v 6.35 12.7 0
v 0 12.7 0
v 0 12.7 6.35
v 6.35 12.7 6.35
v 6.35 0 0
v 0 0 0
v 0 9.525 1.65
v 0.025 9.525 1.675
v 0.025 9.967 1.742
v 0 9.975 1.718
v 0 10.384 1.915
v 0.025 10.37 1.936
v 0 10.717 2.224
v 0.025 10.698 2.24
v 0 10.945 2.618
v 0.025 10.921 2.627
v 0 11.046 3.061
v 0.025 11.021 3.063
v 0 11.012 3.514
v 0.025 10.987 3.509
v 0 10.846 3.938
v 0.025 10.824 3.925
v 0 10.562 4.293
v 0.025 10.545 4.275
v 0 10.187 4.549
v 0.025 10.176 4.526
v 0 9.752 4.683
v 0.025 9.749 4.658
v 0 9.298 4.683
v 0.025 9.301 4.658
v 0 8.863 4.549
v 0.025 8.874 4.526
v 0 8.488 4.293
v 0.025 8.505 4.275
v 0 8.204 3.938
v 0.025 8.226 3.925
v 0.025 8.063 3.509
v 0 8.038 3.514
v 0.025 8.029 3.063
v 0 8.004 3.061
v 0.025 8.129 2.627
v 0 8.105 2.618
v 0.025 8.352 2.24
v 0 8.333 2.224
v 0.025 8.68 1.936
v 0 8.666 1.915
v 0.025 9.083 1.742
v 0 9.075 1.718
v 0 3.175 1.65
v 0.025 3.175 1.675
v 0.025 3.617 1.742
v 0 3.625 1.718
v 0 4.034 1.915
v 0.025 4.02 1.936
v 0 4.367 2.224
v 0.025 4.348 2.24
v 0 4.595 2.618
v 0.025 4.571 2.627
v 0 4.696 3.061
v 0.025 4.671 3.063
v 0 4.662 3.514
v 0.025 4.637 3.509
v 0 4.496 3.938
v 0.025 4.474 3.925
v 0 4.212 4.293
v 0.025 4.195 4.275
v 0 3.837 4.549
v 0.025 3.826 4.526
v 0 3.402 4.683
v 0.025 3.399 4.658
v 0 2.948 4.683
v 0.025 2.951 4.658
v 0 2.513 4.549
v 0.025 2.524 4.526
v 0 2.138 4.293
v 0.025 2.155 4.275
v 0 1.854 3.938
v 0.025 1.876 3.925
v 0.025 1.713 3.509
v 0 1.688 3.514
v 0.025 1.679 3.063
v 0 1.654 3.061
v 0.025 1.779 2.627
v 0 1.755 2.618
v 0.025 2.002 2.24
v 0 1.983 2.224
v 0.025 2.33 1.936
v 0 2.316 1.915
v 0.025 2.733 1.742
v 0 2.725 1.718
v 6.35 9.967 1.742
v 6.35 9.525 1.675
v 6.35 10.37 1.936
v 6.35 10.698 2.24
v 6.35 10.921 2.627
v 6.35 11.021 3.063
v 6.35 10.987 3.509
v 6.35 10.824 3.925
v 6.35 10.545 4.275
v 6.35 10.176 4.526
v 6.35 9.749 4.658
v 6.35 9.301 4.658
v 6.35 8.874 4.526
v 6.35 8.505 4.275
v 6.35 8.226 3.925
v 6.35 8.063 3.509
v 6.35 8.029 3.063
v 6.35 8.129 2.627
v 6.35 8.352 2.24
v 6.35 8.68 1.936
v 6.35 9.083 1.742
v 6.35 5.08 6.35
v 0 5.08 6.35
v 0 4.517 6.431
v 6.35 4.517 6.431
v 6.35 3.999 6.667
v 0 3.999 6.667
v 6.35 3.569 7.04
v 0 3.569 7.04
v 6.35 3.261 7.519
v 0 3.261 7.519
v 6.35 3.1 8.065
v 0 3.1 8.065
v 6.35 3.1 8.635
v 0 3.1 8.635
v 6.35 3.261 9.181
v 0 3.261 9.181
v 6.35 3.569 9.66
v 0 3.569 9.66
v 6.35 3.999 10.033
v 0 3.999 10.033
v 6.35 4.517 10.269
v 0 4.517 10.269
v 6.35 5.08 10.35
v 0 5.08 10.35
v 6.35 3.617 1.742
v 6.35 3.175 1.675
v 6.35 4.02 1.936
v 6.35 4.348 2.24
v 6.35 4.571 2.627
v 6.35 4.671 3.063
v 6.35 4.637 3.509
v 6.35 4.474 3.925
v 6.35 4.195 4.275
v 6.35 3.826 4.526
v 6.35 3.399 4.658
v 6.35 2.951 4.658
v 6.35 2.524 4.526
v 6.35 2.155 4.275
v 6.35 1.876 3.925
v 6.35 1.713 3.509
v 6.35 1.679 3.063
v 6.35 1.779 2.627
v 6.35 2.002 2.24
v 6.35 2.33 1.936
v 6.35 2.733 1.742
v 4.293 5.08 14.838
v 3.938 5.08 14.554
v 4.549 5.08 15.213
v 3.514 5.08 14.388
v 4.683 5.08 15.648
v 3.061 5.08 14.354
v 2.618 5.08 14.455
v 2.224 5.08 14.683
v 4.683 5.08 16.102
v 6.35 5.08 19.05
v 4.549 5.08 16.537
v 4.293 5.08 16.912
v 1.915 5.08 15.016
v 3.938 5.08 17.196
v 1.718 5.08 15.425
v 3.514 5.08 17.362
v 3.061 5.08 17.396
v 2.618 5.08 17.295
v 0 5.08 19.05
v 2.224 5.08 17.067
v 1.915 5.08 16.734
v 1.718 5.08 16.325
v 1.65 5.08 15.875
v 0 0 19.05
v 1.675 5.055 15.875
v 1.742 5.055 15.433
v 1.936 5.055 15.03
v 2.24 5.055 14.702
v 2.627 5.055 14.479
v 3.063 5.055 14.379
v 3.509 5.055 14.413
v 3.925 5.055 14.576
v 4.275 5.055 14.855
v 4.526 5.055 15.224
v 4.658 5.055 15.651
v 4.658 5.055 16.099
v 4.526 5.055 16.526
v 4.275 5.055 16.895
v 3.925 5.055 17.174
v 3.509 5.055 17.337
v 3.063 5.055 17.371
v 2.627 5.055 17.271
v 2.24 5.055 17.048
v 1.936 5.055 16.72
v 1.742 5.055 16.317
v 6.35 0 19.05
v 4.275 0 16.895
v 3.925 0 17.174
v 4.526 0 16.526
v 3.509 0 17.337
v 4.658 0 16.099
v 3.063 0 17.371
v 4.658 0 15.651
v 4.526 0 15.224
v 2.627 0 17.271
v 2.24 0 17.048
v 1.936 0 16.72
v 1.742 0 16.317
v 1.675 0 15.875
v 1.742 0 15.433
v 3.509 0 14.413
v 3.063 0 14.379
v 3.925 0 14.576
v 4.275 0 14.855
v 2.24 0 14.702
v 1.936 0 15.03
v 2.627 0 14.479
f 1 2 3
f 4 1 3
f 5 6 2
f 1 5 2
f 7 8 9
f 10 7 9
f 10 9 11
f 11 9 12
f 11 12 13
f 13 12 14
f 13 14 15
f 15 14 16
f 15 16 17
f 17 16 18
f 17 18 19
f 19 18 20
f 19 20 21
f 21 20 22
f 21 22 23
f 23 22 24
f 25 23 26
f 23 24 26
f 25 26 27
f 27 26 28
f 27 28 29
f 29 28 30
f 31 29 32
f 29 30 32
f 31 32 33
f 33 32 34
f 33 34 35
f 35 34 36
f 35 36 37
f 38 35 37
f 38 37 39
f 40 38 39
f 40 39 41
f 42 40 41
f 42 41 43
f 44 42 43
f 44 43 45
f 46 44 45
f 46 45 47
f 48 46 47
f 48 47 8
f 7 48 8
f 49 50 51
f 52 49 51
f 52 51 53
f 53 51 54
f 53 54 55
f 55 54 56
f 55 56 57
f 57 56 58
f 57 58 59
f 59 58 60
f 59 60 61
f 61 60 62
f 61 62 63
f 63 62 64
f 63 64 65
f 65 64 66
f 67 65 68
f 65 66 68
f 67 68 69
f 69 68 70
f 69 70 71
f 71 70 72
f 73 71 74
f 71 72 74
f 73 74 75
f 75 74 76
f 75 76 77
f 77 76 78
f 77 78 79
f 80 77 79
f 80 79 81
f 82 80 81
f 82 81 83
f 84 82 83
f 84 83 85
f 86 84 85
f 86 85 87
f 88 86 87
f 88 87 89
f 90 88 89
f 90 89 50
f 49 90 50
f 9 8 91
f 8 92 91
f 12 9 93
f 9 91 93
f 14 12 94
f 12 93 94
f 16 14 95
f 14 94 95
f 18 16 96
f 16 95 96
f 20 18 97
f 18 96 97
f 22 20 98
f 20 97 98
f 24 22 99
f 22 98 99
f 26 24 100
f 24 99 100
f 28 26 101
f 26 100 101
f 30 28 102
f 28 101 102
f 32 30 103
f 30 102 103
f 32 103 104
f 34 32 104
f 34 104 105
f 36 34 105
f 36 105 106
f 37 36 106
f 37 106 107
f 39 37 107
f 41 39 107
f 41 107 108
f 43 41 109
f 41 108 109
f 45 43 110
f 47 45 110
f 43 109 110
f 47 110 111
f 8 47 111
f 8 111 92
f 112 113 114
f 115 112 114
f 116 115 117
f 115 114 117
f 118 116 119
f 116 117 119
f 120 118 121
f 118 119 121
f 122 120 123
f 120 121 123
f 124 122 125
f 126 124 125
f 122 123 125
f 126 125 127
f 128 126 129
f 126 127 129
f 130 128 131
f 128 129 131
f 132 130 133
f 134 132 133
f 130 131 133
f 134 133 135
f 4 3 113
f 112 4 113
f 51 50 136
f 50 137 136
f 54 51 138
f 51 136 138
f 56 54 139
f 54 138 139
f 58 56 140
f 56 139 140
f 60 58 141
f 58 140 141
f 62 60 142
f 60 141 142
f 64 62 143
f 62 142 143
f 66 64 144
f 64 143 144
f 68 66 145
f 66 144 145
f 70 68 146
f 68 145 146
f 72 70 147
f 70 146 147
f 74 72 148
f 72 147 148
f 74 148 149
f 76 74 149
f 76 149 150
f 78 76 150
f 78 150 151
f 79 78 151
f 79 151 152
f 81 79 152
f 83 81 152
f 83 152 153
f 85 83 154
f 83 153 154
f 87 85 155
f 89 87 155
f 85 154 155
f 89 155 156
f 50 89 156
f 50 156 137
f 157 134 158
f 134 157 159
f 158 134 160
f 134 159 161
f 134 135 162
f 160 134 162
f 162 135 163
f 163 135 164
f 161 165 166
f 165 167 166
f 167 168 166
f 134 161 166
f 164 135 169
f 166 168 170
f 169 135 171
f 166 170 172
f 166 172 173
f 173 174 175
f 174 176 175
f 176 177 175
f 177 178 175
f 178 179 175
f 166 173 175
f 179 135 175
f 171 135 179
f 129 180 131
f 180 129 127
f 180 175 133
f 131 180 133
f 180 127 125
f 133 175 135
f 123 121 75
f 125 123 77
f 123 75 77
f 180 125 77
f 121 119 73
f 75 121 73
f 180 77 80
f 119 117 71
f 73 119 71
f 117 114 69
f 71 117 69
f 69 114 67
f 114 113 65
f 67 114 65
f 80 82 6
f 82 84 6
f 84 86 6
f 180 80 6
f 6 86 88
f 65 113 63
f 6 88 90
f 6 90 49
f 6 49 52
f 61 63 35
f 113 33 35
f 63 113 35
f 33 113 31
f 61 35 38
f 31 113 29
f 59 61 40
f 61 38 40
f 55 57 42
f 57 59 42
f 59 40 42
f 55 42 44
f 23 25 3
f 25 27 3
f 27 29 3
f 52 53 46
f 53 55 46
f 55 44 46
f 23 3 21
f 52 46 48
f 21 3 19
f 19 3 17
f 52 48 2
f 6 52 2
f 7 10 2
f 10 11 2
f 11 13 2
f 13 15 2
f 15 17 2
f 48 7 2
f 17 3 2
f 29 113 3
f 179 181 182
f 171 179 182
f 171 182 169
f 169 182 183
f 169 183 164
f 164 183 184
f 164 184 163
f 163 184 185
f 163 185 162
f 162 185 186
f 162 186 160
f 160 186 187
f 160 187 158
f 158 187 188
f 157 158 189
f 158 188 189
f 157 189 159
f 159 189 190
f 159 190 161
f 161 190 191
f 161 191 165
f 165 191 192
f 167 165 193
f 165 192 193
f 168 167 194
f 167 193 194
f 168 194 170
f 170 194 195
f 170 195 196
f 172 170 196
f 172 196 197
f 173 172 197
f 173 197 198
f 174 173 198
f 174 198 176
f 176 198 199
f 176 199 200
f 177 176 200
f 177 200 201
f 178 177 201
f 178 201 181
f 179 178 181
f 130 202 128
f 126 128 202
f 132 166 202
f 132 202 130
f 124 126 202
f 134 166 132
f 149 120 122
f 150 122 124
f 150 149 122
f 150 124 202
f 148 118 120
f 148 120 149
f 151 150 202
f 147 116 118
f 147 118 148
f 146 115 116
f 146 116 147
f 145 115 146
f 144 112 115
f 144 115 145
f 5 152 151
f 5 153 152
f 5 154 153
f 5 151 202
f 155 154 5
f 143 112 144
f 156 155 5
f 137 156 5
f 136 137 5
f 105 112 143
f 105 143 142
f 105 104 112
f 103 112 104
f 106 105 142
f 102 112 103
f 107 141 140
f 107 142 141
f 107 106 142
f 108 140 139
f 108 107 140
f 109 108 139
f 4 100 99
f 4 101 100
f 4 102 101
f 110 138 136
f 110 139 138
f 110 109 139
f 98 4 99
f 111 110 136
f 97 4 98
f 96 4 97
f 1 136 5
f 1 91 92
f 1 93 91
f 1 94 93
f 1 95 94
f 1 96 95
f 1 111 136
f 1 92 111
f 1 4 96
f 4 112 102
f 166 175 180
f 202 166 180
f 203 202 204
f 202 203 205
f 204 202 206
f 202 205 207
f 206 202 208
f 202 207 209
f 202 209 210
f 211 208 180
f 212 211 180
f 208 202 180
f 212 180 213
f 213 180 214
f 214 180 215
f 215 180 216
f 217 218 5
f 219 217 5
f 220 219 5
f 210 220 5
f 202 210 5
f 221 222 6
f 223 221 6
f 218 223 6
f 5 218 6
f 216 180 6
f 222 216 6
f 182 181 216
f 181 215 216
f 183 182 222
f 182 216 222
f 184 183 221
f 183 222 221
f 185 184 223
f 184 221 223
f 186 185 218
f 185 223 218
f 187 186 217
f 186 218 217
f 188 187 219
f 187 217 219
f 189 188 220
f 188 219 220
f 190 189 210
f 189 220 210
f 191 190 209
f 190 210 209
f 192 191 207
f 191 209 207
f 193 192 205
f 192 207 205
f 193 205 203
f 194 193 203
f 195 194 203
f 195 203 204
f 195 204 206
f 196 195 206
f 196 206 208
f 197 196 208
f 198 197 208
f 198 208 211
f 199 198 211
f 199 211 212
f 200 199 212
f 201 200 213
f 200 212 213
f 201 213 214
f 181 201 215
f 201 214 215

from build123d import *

# Parameters (mm, degrees)
BOSS_EXTRUDE1_DEPTH             = 6.35
F_3_0MM_DOWEL_HOLE1_D           = 3
F_3_0MM_DOWEL_HOLE1_CSINK_D     = 3.05
F_3_0MM_DOWEL_HOLE1_CSINK_ANGLE = 90
F_3_0MM_DOWEL_HOLE2_D           = 3
F_3_0MM_DOWEL_HOLE2_CSINK_D     = 3.05
F_3_0MM_DOWEL_HOLE2_CSINK_ANGLE = 90


with BuildPart() as part:
    # Sketch1 → Boss-Extrude1 (new body)
    with BuildSketch(Plane(origin=(0, 0, 0), x_dir=(0, 0, -1), z_dir=(1, 0, 0))):
        with BuildLine():
            Line((-19.05, 0), (0, 0))
            Line((0, 0), (0, 12.7))
            Line((0, 12.7), (-6.35, 12.7))
            Line((-6.35, 12.7), (-6.35, 5.08))
            ThreePointArc((-6.35, 5.08), (-8.35, 3.08), (-10.35, 5.08))
            Line((-10.35, 5.08), (-19.05, 5.08))
            Line((-19.05, 5.08), (-19.05, 0))
        make_face()
    extrude(amount=BOSS_EXTRUDE1_DEPTH)

    # Ø3.0mm Dowel Hole1 (through all)
    with Locations(Plane.ZY):
        with Locations((3.175, 3.175), (3.175, 9.525)):
            CounterSinkHole(F_3_0MM_DOWEL_HOLE1_D / 2, F_3_0MM_DOWEL_HOLE1_CSINK_D / 2, counter_sink_angle=F_3_0MM_DOWEL_HOLE1_CSINK_ANGLE)

    # Ø3.0mm Dowel Hole2 (through all)
    with Locations(Plane(origin=(0, 5.08, 0), x_dir=(1, 0, 0), z_dir=(0, 1, 0))):
        with Locations((3.175, -15.875)):
            CounterSinkHole(F_3_0MM_DOWEL_HOLE2_D / 2, F_3_0MM_DOWEL_HOLE2_CSINK_D / 2, counter_sink_angle=F_3_0MM_DOWEL_HOLE2_CSINK_ANGLE)


solid = part.part
